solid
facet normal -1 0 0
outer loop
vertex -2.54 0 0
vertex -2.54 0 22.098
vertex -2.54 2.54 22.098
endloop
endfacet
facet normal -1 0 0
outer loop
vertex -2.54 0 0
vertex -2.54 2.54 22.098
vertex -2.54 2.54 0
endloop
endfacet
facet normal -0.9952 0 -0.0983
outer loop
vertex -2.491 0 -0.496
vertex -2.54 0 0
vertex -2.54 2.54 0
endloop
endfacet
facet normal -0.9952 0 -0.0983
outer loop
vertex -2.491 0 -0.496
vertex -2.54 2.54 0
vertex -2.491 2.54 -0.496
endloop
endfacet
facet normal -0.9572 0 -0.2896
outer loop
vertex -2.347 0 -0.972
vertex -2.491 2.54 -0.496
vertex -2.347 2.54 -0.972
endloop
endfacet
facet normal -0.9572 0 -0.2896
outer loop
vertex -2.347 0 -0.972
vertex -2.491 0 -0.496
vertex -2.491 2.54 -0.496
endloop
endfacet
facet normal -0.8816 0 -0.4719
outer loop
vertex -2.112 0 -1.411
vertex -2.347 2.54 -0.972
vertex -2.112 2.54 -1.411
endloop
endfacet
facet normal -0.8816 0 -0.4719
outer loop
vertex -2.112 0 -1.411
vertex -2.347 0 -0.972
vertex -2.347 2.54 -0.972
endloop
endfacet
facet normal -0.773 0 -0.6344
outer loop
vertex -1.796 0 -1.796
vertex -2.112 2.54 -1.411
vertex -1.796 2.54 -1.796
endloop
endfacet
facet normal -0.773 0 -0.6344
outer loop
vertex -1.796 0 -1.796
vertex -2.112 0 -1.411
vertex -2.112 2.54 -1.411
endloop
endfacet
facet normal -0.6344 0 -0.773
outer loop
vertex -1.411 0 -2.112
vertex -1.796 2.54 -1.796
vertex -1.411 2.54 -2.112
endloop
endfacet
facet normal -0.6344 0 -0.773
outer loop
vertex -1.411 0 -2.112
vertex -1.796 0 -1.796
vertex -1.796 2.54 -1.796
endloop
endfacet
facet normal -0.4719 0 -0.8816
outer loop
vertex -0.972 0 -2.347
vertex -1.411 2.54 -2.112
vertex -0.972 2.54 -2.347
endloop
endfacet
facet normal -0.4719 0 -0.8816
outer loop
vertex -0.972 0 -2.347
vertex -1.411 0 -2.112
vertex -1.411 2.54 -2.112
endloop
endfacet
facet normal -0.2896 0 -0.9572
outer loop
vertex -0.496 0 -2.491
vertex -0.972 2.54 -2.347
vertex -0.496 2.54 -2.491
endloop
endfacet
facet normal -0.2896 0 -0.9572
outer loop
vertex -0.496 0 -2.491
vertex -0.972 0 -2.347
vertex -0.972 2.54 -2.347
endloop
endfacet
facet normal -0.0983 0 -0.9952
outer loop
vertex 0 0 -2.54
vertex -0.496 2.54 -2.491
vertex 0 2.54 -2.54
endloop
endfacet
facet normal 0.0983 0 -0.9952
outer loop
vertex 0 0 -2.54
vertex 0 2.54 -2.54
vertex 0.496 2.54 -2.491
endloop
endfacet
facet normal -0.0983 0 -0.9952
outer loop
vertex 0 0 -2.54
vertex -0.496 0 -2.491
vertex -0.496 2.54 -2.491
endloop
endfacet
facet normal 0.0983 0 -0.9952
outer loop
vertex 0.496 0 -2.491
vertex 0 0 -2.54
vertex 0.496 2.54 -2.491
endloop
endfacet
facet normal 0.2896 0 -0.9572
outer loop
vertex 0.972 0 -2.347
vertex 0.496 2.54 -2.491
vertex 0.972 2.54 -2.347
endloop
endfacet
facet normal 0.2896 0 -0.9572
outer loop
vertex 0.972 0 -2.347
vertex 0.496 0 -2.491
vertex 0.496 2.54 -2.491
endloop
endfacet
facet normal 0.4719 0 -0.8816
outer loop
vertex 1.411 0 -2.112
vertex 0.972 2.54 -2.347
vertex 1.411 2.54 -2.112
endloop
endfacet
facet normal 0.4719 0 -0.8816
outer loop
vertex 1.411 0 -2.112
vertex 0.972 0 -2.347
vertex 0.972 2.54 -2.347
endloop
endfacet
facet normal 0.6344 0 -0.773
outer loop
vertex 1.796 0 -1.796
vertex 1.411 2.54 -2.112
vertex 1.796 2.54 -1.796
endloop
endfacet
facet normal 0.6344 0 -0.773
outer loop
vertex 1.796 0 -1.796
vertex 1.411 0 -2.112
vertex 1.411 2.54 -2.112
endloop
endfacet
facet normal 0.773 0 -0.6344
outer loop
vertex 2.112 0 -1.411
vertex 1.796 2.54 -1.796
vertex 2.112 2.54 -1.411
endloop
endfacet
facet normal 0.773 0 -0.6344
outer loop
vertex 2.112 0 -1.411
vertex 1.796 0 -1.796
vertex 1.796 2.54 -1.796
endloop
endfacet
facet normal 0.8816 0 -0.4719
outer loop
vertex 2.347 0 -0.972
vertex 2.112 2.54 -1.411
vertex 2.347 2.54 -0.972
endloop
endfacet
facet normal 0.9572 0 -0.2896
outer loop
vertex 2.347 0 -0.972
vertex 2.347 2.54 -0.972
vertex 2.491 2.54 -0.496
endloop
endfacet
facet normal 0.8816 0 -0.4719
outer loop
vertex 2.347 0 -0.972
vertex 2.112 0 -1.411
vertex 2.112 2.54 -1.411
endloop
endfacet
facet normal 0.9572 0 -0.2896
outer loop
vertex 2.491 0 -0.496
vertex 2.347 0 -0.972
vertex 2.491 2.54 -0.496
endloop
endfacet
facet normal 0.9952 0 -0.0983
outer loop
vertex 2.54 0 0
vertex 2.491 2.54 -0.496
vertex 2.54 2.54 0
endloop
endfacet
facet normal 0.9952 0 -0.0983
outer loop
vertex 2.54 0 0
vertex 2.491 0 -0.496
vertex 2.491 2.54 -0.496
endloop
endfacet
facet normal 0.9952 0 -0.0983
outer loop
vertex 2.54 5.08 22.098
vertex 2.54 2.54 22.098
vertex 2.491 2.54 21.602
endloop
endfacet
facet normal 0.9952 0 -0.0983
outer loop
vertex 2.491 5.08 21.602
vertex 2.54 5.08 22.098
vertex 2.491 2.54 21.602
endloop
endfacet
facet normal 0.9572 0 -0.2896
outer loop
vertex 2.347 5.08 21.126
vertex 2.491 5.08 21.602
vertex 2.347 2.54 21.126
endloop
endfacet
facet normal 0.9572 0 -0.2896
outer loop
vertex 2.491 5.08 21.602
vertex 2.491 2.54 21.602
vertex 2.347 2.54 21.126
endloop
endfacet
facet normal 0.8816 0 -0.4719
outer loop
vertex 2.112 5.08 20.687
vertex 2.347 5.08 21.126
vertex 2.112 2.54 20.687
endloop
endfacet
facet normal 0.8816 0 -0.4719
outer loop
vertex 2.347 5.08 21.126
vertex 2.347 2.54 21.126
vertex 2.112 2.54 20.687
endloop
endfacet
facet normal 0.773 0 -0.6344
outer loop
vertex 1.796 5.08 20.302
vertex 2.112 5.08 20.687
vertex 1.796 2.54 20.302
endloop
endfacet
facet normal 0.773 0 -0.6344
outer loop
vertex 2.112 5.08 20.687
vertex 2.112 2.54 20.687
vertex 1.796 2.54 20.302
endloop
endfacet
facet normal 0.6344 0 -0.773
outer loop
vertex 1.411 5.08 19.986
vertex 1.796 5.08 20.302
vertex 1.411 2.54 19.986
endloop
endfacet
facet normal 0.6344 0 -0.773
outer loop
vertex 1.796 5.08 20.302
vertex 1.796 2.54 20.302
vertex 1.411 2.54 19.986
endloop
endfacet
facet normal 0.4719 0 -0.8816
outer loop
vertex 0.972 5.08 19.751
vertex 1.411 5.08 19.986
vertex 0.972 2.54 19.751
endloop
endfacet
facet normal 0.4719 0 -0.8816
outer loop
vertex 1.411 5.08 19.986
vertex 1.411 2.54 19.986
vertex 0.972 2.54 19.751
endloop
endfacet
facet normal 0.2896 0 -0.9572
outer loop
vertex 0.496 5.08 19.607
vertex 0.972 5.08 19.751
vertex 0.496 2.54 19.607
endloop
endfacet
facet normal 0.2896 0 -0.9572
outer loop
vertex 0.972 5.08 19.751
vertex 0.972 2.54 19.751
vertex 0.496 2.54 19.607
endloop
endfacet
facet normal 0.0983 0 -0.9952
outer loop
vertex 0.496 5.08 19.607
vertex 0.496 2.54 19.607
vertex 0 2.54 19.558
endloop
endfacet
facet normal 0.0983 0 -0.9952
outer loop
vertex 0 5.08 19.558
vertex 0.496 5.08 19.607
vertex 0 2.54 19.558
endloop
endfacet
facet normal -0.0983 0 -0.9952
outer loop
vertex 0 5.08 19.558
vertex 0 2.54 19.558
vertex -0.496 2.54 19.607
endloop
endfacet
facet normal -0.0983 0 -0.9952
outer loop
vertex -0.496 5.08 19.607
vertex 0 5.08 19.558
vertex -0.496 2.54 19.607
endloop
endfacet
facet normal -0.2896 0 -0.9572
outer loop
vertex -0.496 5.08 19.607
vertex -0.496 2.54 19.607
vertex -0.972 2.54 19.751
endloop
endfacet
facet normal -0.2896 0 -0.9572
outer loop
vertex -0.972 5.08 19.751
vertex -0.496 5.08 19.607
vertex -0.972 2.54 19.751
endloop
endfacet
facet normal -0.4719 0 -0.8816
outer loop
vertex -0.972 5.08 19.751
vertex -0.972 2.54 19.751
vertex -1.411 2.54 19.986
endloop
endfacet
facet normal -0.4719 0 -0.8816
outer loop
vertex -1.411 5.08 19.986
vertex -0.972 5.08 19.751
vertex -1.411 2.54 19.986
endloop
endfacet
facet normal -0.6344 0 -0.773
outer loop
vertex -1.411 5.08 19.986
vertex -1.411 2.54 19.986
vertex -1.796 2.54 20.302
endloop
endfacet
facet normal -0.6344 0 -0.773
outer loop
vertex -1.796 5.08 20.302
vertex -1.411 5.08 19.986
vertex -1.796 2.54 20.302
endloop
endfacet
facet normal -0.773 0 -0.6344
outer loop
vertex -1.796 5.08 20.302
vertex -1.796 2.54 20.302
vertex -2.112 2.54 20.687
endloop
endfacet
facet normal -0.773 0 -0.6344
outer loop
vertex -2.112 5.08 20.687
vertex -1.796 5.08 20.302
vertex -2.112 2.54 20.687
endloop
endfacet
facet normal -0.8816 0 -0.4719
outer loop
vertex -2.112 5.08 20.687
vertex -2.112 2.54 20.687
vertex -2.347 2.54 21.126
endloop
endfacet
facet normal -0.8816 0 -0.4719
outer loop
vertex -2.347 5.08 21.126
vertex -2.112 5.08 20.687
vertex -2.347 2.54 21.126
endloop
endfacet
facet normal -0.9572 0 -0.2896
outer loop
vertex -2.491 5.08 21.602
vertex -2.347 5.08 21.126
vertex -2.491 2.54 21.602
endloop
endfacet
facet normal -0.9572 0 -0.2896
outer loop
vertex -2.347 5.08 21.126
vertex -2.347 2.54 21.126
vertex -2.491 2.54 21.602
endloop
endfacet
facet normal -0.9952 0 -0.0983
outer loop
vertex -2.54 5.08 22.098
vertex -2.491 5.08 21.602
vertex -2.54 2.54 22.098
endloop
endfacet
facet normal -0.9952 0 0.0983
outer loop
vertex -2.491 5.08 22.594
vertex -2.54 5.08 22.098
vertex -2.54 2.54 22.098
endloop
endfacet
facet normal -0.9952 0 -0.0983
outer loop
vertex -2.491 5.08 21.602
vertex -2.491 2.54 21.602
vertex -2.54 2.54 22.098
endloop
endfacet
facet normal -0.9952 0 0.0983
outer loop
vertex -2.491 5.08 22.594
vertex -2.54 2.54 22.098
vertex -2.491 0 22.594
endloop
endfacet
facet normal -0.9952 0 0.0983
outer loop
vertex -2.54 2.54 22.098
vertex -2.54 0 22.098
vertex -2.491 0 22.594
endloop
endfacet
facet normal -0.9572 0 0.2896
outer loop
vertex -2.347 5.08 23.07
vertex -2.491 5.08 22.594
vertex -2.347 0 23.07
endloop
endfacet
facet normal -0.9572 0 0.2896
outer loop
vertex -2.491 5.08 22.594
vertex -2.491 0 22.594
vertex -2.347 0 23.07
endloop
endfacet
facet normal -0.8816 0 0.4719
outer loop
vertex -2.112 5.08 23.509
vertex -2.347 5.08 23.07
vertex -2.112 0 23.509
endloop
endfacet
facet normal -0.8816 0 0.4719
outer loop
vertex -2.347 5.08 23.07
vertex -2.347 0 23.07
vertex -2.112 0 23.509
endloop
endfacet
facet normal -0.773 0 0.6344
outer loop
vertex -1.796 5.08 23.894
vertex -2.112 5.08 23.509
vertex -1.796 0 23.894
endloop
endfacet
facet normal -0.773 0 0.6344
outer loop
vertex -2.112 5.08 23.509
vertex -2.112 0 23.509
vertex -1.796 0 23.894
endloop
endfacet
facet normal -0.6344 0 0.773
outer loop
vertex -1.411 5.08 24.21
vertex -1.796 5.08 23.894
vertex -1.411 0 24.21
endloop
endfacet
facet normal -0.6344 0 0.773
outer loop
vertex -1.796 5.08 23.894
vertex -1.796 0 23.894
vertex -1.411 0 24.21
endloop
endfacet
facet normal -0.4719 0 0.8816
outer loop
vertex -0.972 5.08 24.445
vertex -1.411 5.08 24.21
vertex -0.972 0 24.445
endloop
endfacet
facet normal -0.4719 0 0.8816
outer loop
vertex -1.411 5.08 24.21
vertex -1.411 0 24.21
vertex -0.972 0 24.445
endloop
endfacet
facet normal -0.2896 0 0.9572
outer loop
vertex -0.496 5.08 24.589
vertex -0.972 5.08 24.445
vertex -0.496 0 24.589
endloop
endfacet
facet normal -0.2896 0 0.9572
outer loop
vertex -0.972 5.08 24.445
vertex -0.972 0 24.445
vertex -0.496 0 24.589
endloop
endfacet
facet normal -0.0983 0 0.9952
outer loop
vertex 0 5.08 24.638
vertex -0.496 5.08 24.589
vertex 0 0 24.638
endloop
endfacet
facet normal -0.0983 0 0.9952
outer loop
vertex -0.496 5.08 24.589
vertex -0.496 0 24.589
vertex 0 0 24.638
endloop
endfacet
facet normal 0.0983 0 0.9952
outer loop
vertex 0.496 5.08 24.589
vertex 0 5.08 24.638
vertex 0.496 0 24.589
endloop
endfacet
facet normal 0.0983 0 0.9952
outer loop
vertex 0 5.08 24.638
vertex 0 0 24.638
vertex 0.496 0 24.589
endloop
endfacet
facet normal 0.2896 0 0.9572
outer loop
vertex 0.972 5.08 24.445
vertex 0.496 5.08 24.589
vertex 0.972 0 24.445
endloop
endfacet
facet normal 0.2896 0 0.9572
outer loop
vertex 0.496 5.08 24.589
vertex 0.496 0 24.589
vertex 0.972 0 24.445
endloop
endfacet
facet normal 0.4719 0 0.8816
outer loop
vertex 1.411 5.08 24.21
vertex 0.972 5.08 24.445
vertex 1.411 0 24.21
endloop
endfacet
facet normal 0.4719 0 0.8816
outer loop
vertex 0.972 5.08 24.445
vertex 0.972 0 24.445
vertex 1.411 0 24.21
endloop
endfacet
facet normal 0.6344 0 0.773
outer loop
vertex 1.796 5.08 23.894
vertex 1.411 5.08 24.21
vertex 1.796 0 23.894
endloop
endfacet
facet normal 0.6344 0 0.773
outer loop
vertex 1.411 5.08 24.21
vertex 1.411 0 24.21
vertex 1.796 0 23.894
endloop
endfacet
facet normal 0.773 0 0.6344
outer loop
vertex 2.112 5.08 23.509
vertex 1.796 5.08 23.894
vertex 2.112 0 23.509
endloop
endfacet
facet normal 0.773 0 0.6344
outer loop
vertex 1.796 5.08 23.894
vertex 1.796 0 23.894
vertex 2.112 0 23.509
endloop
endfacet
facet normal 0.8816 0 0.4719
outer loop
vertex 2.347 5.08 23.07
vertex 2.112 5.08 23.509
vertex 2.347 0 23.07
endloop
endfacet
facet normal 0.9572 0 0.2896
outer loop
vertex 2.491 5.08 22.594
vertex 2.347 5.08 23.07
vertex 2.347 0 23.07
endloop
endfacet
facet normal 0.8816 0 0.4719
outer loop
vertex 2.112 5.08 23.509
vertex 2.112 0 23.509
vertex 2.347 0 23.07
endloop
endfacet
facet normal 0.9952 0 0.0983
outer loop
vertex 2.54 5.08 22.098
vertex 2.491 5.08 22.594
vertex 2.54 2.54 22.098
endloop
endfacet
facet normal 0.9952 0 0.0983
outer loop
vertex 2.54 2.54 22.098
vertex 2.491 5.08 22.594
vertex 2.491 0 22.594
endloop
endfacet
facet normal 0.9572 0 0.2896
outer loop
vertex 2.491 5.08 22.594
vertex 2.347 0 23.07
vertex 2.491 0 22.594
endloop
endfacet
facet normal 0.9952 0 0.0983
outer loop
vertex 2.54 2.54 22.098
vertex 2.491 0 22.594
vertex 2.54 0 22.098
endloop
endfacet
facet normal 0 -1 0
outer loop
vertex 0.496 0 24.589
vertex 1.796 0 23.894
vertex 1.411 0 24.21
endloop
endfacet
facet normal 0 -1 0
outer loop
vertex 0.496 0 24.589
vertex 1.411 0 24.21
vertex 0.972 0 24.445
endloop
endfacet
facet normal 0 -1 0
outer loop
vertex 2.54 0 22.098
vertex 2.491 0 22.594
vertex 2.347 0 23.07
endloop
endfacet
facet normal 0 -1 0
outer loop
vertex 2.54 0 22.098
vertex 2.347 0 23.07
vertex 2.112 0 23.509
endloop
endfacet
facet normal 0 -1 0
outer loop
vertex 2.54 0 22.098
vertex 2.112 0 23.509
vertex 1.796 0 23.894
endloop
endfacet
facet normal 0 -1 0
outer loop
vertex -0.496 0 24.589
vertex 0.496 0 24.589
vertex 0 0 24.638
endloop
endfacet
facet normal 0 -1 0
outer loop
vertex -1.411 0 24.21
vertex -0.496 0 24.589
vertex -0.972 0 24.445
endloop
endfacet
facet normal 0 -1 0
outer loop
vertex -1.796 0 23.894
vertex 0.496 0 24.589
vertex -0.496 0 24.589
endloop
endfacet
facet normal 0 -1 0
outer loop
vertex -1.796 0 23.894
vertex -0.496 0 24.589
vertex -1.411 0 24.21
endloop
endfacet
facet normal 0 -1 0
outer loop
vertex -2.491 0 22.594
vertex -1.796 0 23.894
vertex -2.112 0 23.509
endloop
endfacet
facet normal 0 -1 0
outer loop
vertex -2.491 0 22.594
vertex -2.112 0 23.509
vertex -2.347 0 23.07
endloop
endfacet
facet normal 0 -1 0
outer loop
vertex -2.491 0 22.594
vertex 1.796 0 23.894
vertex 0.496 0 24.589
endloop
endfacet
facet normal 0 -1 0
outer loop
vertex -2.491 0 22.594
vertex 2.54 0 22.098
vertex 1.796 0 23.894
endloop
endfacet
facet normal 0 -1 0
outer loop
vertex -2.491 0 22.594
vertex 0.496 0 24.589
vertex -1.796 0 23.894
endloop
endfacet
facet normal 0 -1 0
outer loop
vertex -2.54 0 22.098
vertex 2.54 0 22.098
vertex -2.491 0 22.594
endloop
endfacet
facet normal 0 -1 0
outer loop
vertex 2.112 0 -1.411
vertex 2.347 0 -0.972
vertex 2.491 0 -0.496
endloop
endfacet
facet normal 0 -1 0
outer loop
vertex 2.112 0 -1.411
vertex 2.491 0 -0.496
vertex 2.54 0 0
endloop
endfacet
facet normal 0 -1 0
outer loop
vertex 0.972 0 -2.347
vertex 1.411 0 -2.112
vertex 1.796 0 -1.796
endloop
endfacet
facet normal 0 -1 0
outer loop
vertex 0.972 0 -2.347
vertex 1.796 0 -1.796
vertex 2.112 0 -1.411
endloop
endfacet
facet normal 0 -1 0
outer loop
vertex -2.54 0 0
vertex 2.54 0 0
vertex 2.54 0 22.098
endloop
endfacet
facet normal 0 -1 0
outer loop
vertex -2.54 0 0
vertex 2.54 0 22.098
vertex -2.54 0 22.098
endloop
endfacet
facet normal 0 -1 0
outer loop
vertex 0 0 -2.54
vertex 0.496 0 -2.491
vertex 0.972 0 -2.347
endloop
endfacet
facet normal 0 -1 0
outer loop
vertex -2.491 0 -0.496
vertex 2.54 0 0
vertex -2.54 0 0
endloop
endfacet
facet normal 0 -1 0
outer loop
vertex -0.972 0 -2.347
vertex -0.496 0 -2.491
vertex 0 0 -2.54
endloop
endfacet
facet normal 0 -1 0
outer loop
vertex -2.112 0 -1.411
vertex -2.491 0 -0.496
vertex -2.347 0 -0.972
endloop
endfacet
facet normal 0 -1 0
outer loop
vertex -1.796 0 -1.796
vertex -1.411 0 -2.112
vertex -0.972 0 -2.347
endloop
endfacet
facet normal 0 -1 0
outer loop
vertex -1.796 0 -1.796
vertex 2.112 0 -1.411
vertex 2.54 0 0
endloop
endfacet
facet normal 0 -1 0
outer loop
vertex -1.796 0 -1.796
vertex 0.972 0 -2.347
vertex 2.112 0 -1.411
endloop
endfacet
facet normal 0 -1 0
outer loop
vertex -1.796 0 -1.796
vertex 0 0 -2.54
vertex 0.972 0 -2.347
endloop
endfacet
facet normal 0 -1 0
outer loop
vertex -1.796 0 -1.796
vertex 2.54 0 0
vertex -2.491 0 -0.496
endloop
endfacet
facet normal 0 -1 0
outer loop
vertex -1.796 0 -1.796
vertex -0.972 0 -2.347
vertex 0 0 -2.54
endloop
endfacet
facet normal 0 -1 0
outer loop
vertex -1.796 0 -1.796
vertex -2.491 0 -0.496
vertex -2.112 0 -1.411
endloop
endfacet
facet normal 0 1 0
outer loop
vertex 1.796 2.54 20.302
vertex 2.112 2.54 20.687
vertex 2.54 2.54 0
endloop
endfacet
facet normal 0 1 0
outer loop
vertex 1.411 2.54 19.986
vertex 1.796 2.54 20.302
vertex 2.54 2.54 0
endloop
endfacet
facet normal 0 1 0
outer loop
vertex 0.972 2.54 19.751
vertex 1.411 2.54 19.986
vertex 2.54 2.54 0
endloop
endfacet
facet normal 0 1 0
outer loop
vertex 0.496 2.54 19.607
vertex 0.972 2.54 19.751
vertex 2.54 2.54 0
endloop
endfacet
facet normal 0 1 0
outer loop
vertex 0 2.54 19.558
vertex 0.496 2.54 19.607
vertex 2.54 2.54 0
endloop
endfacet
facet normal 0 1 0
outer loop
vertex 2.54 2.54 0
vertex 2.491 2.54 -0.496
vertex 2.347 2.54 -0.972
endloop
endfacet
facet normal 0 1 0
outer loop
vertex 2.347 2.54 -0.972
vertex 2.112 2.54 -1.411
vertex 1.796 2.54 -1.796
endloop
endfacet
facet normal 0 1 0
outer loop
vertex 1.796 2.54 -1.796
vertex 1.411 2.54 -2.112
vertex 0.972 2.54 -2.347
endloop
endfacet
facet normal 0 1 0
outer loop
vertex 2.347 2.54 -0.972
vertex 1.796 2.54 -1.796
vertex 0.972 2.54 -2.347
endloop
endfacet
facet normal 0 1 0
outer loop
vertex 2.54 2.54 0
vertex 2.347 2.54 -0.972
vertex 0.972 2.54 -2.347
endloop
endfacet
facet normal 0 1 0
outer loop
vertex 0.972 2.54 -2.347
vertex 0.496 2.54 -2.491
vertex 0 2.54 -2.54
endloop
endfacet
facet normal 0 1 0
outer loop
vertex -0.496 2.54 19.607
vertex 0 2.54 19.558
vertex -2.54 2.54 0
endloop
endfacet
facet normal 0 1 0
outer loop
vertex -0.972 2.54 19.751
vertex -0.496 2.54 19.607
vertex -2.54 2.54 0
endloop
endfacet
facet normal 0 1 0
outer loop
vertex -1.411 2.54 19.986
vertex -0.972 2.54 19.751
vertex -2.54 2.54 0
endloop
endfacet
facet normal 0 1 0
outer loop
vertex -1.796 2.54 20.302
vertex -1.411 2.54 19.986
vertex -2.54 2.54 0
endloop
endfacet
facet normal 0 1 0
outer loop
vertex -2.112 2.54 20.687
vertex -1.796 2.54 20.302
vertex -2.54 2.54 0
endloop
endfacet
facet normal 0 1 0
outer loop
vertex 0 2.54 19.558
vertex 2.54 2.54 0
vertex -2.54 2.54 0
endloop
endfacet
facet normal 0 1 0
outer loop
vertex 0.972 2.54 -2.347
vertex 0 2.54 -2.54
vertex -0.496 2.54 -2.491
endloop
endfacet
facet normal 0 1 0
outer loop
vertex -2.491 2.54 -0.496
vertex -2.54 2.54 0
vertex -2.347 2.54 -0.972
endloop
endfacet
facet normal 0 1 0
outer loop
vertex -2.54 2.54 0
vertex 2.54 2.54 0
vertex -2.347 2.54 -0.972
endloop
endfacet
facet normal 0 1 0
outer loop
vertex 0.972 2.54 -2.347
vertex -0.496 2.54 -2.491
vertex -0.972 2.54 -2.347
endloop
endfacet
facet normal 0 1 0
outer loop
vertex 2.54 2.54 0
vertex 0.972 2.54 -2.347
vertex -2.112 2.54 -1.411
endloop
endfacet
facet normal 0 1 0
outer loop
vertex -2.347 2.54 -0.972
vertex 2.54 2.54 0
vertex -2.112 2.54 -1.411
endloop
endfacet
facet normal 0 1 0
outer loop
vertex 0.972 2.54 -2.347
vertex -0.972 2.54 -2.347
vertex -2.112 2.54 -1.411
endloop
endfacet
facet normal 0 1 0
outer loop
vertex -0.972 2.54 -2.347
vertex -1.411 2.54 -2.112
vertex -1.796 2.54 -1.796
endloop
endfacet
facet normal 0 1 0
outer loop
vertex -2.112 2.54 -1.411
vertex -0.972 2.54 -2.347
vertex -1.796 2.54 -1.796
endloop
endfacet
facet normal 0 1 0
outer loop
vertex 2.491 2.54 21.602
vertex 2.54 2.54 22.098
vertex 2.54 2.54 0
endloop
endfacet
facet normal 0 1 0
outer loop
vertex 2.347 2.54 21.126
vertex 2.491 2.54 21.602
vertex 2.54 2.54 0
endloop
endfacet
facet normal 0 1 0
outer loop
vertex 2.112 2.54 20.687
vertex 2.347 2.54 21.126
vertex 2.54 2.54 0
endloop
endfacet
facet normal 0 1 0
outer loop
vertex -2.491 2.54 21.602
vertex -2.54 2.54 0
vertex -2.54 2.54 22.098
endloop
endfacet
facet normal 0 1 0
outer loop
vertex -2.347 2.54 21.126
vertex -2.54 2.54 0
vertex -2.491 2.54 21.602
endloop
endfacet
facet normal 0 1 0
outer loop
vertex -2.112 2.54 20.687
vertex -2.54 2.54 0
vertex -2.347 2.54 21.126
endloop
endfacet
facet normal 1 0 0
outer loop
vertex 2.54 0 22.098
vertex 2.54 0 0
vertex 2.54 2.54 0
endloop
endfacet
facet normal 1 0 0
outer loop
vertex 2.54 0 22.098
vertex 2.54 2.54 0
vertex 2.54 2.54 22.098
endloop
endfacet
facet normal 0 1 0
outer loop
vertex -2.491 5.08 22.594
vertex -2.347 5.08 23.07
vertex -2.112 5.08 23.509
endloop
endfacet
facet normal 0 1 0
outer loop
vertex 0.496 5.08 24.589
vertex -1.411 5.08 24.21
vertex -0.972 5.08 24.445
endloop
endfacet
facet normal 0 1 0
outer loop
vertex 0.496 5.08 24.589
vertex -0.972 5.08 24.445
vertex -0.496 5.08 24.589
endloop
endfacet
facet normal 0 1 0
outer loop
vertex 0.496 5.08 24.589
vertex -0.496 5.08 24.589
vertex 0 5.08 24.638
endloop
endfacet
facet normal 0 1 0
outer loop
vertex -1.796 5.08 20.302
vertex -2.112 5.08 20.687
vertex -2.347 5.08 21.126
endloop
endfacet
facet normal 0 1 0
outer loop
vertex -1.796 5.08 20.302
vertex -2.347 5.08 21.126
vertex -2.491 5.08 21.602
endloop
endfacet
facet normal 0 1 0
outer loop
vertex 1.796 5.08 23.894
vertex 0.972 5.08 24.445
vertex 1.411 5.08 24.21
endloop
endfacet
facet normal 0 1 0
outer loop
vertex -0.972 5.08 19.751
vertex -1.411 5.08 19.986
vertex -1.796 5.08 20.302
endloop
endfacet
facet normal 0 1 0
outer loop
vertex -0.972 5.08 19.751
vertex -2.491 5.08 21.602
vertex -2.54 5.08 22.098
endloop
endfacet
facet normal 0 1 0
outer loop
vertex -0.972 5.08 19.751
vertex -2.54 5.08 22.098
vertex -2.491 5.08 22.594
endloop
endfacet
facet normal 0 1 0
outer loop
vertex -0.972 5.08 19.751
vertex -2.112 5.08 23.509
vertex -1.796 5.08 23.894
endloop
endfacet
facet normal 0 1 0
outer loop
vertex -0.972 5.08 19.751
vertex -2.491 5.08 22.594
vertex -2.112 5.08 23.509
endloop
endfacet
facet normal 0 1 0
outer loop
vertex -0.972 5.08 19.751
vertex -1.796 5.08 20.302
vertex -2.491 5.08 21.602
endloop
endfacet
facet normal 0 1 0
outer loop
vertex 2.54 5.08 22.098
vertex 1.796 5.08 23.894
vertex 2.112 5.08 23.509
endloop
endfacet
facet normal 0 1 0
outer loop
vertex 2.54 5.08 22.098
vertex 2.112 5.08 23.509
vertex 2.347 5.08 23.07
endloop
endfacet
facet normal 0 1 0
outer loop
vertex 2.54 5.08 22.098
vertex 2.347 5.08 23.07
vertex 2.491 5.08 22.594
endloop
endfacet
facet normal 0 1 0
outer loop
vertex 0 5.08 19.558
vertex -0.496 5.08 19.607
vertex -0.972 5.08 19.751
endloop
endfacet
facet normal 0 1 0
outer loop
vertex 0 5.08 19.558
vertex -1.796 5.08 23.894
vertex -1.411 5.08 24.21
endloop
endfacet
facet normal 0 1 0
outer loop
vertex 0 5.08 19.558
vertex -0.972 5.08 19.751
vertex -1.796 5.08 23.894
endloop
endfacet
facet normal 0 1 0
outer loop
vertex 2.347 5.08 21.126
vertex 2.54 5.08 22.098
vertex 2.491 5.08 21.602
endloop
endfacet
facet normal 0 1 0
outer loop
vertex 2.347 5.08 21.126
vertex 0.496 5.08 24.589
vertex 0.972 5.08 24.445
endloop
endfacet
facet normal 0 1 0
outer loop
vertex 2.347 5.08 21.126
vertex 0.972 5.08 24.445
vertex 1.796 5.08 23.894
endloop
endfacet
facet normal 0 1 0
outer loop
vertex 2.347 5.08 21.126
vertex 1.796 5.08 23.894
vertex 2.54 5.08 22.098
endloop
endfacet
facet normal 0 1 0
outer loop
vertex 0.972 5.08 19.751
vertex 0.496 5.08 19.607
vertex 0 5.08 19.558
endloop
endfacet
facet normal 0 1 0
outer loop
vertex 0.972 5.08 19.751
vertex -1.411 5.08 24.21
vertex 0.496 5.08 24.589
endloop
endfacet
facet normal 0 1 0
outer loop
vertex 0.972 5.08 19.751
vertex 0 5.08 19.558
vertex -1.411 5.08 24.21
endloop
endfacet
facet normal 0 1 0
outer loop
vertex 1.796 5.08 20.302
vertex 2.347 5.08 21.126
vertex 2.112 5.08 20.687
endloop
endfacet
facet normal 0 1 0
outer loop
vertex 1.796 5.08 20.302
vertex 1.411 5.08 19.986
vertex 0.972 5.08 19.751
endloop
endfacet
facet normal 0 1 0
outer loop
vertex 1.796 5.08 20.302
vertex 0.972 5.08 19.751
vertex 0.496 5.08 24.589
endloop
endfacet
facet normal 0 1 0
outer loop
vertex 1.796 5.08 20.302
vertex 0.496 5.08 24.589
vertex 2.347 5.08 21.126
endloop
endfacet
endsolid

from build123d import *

# Parameters (mm, degrees)
BOSS_EXTRUDE1_DEPTH = 2.54
BOSS_EXTRUDE2_DEPTH = 2.54


with BuildPart() as part:
    # Sketch1 → Boss-Extrude1 (new body)
    with BuildSketch(Plane(origin=(0, 0, 0), x_dir=(1, 0, 0), z_dir=(0, 1, 0))):
        with BuildLine():
            Line((2.54, 0), (2.54, -22.098))
            ThreePointArc((2.54, -22.098), (0, -24.638), (-2.54, -22.098))
            Line((-2.54, -22.098), (-2.54, 0))
            ThreePointArc((-2.54, 0), (0, 2.54), (2.54, 0))
        make_face()
    extrude(amount=BOSS_EXTRUDE1_DEPTH)

    # Sketch2 → Boss-Extrude2 (add)
    with BuildSketch(Plane(origin=(0, 2.54, 0), x_dir=(1, 0, 0), z_dir=(0, 1, 0))):
        with BuildLine():
            ThreePointArc((-2.54, -22.098), (0, -24.638), (2.54, -22.098))
            ThreePointArc((2.54, -22.098), (0, -19.558), (-2.54, -22.098))
        make_face()
    extrude(amount=BOSS_EXTRUDE2_DEPTH)


solid = part.part
